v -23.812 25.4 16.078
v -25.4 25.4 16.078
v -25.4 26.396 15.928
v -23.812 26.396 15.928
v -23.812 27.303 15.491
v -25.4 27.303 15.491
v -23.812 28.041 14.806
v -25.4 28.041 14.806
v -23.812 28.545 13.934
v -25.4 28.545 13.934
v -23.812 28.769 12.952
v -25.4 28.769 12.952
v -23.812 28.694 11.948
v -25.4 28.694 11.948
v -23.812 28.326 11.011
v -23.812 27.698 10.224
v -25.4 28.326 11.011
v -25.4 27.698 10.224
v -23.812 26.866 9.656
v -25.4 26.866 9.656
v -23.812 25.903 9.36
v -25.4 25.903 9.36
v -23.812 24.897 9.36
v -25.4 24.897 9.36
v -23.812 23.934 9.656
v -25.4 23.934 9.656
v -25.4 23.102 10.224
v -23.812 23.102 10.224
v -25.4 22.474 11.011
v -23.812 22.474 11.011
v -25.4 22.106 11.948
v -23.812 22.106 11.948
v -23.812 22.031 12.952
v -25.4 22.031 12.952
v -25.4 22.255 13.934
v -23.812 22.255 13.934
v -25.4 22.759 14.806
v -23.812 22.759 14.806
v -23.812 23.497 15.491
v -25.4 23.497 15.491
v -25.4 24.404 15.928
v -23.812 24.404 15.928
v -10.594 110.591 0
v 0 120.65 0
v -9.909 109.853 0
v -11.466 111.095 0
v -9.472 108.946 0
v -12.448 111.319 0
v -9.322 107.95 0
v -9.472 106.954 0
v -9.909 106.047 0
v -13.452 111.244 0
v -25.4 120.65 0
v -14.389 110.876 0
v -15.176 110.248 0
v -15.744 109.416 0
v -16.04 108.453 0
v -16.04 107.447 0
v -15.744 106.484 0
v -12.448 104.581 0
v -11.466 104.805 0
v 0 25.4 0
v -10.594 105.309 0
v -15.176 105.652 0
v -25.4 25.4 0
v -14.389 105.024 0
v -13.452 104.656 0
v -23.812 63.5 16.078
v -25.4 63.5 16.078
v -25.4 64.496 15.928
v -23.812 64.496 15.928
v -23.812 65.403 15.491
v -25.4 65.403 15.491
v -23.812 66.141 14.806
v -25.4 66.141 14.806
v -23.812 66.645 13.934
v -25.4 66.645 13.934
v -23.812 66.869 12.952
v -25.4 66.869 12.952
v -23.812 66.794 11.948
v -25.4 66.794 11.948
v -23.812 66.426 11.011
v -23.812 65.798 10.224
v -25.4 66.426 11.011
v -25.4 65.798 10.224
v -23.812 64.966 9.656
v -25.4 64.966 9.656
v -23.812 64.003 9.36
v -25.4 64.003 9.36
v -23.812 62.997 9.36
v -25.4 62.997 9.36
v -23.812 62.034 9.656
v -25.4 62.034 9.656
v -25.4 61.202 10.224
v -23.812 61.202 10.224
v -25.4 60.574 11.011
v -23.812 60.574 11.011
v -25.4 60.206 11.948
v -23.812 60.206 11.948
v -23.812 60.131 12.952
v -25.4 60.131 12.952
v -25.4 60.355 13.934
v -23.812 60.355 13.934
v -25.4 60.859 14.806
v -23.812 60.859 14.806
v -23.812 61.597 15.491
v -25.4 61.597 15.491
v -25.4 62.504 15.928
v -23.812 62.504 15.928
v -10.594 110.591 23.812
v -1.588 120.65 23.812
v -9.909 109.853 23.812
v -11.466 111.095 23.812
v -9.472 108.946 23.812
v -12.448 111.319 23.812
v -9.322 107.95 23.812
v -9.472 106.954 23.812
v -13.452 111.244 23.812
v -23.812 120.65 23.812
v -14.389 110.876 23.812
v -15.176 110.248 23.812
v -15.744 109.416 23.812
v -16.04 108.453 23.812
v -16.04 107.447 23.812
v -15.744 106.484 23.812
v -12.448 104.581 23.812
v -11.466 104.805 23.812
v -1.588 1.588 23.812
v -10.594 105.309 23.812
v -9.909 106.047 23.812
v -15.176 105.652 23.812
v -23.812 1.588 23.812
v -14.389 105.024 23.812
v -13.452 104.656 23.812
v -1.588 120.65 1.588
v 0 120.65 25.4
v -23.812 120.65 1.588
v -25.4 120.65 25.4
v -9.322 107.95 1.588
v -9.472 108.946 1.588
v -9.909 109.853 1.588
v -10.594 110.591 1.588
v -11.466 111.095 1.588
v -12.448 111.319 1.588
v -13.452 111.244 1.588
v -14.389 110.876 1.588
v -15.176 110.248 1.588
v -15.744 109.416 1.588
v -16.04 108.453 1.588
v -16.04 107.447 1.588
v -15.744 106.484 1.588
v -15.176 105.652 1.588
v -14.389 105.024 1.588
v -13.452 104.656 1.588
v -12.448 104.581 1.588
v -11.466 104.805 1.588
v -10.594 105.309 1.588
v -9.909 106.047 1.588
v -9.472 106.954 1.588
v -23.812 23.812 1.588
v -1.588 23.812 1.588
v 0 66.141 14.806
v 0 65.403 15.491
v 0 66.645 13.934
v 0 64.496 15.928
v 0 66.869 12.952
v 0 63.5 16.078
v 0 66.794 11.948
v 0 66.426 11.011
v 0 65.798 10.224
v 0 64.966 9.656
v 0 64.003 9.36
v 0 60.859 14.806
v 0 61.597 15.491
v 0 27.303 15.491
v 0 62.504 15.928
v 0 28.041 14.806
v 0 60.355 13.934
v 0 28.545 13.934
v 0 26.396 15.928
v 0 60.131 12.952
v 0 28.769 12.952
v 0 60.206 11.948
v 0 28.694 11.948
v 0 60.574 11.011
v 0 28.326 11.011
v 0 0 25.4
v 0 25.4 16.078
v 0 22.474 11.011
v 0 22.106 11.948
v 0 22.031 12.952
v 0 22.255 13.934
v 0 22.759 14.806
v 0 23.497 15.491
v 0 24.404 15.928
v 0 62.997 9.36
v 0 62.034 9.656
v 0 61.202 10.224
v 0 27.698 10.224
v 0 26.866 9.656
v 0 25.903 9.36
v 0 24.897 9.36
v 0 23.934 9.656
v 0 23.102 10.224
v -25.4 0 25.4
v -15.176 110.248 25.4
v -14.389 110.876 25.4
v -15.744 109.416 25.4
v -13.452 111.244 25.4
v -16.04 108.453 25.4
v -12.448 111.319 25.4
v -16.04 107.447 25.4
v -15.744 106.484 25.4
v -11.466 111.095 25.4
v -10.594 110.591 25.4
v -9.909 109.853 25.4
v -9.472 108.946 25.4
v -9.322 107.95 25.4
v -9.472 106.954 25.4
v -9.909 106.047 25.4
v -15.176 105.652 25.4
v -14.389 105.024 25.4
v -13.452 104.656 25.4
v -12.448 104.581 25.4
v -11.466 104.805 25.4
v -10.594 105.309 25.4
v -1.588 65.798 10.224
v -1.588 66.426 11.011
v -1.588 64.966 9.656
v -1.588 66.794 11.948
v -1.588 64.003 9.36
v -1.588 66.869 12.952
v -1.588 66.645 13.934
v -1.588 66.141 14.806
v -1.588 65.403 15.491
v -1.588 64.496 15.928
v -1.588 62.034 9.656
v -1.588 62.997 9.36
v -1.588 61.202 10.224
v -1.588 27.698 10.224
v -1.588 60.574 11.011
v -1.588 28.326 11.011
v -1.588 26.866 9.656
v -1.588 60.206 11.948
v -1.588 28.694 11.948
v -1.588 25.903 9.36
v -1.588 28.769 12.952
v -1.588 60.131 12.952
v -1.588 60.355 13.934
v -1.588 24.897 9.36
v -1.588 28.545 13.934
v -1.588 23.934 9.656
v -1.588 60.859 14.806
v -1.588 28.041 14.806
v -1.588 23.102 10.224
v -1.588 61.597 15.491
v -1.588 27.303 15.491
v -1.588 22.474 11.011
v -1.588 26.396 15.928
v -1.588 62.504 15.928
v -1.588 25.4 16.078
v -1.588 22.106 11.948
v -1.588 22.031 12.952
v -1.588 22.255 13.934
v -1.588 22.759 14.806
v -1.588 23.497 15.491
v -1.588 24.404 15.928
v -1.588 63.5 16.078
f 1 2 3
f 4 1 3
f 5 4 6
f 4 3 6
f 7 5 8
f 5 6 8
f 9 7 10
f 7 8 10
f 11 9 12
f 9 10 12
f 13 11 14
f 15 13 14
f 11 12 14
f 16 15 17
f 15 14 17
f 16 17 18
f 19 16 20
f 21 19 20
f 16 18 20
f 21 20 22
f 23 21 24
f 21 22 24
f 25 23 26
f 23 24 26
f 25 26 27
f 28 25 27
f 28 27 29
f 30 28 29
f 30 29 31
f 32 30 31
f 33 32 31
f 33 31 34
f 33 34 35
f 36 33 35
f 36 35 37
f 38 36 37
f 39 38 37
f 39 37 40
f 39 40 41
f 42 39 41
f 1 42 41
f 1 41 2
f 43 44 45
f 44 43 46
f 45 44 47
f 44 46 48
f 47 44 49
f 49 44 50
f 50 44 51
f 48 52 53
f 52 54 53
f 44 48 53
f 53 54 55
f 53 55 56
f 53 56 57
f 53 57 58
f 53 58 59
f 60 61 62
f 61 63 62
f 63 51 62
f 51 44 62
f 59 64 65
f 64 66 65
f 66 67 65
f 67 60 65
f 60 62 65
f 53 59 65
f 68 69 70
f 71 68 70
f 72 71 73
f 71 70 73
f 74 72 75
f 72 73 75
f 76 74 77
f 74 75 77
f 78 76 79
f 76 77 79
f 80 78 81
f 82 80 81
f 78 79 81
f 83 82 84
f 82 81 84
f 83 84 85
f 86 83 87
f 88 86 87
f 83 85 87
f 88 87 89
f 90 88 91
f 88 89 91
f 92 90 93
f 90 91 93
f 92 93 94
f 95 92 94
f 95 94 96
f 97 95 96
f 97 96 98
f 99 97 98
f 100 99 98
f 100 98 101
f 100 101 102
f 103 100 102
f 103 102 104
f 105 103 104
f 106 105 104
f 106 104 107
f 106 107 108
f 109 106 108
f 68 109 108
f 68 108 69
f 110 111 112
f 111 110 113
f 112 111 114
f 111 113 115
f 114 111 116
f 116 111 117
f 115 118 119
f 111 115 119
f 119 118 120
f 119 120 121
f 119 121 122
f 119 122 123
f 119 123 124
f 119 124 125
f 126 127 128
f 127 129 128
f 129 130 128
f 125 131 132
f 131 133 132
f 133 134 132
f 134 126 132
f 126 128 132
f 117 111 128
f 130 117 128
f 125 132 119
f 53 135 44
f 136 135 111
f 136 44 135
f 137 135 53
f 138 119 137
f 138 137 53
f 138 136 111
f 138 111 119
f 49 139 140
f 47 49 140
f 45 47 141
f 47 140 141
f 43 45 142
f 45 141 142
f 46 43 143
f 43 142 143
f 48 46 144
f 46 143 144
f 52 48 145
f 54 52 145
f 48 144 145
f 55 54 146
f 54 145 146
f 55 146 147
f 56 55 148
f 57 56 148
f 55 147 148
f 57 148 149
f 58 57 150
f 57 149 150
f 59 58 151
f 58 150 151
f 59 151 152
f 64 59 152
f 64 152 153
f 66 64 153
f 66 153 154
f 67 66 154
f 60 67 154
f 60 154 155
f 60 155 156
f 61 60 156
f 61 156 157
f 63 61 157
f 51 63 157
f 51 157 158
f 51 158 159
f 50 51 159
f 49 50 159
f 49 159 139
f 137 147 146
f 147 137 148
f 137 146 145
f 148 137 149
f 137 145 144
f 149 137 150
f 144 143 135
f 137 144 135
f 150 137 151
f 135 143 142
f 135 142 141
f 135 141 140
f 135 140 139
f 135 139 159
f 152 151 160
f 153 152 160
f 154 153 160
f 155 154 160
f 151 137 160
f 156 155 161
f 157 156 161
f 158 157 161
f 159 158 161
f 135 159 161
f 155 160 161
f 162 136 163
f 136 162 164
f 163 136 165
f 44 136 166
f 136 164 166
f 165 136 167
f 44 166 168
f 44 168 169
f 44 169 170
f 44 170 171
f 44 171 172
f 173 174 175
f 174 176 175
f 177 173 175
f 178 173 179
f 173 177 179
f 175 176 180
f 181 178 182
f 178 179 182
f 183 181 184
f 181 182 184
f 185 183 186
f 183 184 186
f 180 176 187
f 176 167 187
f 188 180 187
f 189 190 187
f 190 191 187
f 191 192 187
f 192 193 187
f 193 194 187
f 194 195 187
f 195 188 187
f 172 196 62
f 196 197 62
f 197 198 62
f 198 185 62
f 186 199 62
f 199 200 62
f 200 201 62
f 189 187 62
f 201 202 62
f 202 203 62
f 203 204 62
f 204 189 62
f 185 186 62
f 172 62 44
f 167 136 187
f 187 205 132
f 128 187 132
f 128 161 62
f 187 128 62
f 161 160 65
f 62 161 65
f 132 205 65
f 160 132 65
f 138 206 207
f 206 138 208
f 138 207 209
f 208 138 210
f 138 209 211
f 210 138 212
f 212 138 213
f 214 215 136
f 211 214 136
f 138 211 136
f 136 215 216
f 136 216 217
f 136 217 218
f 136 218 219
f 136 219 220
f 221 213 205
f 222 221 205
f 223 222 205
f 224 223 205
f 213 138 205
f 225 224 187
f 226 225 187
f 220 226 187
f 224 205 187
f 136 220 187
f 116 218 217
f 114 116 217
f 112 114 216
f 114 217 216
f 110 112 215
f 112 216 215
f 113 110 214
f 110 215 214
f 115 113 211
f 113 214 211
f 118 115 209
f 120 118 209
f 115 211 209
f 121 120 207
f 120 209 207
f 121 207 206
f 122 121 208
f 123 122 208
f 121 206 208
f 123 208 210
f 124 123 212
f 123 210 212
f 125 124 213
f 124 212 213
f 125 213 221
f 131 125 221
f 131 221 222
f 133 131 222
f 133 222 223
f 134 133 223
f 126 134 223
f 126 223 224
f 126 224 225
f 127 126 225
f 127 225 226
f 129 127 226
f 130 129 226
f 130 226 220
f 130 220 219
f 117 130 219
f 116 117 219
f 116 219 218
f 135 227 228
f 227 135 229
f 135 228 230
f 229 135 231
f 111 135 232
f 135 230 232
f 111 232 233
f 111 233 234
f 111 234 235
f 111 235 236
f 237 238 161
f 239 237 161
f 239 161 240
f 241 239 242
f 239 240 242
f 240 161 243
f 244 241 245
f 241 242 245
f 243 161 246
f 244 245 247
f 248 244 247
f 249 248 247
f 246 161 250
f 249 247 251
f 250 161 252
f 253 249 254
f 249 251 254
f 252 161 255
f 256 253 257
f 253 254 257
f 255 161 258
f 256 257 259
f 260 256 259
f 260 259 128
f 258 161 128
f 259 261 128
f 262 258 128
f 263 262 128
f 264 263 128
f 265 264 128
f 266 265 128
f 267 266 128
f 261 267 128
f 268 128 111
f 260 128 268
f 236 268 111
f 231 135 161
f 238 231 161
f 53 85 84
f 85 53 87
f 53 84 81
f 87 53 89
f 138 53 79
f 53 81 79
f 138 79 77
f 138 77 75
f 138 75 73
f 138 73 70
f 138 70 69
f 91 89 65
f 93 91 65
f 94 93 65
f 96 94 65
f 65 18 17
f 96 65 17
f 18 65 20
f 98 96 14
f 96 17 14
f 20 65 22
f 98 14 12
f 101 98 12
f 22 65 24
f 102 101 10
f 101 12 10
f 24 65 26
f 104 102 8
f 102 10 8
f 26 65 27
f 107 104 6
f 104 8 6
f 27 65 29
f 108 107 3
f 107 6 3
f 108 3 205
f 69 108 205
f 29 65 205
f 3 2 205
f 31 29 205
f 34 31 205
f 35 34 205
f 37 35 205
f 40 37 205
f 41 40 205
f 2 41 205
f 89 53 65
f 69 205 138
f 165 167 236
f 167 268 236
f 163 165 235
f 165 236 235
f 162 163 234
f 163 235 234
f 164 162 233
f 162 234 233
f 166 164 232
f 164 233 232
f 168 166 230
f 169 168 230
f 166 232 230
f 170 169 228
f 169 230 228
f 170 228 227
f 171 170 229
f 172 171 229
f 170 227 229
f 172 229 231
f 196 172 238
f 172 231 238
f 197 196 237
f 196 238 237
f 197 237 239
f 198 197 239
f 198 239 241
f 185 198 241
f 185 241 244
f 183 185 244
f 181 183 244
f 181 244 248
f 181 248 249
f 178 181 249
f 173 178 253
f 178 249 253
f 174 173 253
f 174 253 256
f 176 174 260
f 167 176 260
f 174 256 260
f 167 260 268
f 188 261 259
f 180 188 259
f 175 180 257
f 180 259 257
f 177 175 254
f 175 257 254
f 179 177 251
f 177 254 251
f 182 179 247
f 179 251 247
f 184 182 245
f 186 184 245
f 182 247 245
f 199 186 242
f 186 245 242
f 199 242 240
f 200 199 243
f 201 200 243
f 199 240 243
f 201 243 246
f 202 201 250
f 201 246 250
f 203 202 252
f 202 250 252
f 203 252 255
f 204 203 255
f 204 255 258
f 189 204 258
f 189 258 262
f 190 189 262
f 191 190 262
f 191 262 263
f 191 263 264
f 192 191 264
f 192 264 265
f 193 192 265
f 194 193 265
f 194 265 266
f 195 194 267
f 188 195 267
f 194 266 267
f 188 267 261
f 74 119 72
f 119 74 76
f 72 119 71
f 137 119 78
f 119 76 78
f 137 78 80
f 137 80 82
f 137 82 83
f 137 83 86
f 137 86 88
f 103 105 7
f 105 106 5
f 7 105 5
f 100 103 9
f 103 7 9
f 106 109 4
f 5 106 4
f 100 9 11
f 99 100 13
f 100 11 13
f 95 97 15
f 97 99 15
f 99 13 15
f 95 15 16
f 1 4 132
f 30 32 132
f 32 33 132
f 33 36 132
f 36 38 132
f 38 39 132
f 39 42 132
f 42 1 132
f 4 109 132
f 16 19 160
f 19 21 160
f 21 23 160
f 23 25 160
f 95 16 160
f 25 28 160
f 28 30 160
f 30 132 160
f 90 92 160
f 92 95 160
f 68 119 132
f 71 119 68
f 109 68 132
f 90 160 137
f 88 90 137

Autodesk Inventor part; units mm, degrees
ref_plane "YZ Plane" through (0, 0, 0) normal (1, 0, 0) x (0, 1, 0)
ref_plane "XZ Plane" through (0, 0, 0) normal (0, 1, 0) x (-1, 0, 0)
ref_plane "XY Plane" through (0, 0, 0) normal (0, 0, 1) x (1, 0, 0)
sketch "Sketch1" plane through (0, 0, 0) normal (0, 1, 0) x (-1, 0, 0)
  line L0 (0, 0) -> (25.4, 0)
  line L1 (25.4, 0) -> (25.4, 25.4)
  line L2 (25.4, 25.4) -> (0, 25.4)
  line L3 (0, 25.4) -> (0, 0)
  line L4 (1.5875, 23.8125) -> (23.8125, 23.8125)
  line L5 (23.8125, 23.8125) -> (23.8125, 1.5875)
  line L6 (23.8125, 1.5875) -> (1.5875, 1.5875)
  line L7 (1.5875, 1.5875) -> (1.5875, 23.8125)
  dimension "d0" = 25.4
  dimension "d2" = 25.4
  dimension "d3" = 1.5875
extrude "Extrusion1" add sketch "Sketch1" along normal blind 120.65
sketch "Sketch2" plane through (-25.4, 0, 0) normal (-1, 0, 0) x (0, 0, 1)
  line L0 (0, 0) -> (25.4, 0) projected
  line L1 (0, 0) -> (0, 120.65) projected
  line L2 (25.4, 0) -> (0, 25.4)
  dimension "d6" = 45
extrude "Extrusion2" cut sketch "Sketch2" against normal blind 25.4
sketch "Sketch3" plane through (-25.4, 120.65, 0) normal (-1, 0, 0) x (0, 0, 1)
  circle A0 centre (12.7, -95.25) radius 3.3782 projected
  circle A1 centre (12.7, -57.15) radius 3.3782 projected
  point P0 (0, -120.65)
extrude "Extrusion3" cut sketch "Sketch3" against normal blind 25.4
sketch "Sketch4" plane through (-25.4, 120.65, 25.4) normal (0, 0, 1) x (1, 0, 0)
  circle A0 centre (12.7, -12.7) radius 3.3782 projected
  circle A1 centre (12.7, -12.7) radius 3.3782 projected
extrude "Extrusion4" cut sketch "Sketch4" against normal blind 25.4
properties part number "Square Tube 6" material "Aluminum 6061"
